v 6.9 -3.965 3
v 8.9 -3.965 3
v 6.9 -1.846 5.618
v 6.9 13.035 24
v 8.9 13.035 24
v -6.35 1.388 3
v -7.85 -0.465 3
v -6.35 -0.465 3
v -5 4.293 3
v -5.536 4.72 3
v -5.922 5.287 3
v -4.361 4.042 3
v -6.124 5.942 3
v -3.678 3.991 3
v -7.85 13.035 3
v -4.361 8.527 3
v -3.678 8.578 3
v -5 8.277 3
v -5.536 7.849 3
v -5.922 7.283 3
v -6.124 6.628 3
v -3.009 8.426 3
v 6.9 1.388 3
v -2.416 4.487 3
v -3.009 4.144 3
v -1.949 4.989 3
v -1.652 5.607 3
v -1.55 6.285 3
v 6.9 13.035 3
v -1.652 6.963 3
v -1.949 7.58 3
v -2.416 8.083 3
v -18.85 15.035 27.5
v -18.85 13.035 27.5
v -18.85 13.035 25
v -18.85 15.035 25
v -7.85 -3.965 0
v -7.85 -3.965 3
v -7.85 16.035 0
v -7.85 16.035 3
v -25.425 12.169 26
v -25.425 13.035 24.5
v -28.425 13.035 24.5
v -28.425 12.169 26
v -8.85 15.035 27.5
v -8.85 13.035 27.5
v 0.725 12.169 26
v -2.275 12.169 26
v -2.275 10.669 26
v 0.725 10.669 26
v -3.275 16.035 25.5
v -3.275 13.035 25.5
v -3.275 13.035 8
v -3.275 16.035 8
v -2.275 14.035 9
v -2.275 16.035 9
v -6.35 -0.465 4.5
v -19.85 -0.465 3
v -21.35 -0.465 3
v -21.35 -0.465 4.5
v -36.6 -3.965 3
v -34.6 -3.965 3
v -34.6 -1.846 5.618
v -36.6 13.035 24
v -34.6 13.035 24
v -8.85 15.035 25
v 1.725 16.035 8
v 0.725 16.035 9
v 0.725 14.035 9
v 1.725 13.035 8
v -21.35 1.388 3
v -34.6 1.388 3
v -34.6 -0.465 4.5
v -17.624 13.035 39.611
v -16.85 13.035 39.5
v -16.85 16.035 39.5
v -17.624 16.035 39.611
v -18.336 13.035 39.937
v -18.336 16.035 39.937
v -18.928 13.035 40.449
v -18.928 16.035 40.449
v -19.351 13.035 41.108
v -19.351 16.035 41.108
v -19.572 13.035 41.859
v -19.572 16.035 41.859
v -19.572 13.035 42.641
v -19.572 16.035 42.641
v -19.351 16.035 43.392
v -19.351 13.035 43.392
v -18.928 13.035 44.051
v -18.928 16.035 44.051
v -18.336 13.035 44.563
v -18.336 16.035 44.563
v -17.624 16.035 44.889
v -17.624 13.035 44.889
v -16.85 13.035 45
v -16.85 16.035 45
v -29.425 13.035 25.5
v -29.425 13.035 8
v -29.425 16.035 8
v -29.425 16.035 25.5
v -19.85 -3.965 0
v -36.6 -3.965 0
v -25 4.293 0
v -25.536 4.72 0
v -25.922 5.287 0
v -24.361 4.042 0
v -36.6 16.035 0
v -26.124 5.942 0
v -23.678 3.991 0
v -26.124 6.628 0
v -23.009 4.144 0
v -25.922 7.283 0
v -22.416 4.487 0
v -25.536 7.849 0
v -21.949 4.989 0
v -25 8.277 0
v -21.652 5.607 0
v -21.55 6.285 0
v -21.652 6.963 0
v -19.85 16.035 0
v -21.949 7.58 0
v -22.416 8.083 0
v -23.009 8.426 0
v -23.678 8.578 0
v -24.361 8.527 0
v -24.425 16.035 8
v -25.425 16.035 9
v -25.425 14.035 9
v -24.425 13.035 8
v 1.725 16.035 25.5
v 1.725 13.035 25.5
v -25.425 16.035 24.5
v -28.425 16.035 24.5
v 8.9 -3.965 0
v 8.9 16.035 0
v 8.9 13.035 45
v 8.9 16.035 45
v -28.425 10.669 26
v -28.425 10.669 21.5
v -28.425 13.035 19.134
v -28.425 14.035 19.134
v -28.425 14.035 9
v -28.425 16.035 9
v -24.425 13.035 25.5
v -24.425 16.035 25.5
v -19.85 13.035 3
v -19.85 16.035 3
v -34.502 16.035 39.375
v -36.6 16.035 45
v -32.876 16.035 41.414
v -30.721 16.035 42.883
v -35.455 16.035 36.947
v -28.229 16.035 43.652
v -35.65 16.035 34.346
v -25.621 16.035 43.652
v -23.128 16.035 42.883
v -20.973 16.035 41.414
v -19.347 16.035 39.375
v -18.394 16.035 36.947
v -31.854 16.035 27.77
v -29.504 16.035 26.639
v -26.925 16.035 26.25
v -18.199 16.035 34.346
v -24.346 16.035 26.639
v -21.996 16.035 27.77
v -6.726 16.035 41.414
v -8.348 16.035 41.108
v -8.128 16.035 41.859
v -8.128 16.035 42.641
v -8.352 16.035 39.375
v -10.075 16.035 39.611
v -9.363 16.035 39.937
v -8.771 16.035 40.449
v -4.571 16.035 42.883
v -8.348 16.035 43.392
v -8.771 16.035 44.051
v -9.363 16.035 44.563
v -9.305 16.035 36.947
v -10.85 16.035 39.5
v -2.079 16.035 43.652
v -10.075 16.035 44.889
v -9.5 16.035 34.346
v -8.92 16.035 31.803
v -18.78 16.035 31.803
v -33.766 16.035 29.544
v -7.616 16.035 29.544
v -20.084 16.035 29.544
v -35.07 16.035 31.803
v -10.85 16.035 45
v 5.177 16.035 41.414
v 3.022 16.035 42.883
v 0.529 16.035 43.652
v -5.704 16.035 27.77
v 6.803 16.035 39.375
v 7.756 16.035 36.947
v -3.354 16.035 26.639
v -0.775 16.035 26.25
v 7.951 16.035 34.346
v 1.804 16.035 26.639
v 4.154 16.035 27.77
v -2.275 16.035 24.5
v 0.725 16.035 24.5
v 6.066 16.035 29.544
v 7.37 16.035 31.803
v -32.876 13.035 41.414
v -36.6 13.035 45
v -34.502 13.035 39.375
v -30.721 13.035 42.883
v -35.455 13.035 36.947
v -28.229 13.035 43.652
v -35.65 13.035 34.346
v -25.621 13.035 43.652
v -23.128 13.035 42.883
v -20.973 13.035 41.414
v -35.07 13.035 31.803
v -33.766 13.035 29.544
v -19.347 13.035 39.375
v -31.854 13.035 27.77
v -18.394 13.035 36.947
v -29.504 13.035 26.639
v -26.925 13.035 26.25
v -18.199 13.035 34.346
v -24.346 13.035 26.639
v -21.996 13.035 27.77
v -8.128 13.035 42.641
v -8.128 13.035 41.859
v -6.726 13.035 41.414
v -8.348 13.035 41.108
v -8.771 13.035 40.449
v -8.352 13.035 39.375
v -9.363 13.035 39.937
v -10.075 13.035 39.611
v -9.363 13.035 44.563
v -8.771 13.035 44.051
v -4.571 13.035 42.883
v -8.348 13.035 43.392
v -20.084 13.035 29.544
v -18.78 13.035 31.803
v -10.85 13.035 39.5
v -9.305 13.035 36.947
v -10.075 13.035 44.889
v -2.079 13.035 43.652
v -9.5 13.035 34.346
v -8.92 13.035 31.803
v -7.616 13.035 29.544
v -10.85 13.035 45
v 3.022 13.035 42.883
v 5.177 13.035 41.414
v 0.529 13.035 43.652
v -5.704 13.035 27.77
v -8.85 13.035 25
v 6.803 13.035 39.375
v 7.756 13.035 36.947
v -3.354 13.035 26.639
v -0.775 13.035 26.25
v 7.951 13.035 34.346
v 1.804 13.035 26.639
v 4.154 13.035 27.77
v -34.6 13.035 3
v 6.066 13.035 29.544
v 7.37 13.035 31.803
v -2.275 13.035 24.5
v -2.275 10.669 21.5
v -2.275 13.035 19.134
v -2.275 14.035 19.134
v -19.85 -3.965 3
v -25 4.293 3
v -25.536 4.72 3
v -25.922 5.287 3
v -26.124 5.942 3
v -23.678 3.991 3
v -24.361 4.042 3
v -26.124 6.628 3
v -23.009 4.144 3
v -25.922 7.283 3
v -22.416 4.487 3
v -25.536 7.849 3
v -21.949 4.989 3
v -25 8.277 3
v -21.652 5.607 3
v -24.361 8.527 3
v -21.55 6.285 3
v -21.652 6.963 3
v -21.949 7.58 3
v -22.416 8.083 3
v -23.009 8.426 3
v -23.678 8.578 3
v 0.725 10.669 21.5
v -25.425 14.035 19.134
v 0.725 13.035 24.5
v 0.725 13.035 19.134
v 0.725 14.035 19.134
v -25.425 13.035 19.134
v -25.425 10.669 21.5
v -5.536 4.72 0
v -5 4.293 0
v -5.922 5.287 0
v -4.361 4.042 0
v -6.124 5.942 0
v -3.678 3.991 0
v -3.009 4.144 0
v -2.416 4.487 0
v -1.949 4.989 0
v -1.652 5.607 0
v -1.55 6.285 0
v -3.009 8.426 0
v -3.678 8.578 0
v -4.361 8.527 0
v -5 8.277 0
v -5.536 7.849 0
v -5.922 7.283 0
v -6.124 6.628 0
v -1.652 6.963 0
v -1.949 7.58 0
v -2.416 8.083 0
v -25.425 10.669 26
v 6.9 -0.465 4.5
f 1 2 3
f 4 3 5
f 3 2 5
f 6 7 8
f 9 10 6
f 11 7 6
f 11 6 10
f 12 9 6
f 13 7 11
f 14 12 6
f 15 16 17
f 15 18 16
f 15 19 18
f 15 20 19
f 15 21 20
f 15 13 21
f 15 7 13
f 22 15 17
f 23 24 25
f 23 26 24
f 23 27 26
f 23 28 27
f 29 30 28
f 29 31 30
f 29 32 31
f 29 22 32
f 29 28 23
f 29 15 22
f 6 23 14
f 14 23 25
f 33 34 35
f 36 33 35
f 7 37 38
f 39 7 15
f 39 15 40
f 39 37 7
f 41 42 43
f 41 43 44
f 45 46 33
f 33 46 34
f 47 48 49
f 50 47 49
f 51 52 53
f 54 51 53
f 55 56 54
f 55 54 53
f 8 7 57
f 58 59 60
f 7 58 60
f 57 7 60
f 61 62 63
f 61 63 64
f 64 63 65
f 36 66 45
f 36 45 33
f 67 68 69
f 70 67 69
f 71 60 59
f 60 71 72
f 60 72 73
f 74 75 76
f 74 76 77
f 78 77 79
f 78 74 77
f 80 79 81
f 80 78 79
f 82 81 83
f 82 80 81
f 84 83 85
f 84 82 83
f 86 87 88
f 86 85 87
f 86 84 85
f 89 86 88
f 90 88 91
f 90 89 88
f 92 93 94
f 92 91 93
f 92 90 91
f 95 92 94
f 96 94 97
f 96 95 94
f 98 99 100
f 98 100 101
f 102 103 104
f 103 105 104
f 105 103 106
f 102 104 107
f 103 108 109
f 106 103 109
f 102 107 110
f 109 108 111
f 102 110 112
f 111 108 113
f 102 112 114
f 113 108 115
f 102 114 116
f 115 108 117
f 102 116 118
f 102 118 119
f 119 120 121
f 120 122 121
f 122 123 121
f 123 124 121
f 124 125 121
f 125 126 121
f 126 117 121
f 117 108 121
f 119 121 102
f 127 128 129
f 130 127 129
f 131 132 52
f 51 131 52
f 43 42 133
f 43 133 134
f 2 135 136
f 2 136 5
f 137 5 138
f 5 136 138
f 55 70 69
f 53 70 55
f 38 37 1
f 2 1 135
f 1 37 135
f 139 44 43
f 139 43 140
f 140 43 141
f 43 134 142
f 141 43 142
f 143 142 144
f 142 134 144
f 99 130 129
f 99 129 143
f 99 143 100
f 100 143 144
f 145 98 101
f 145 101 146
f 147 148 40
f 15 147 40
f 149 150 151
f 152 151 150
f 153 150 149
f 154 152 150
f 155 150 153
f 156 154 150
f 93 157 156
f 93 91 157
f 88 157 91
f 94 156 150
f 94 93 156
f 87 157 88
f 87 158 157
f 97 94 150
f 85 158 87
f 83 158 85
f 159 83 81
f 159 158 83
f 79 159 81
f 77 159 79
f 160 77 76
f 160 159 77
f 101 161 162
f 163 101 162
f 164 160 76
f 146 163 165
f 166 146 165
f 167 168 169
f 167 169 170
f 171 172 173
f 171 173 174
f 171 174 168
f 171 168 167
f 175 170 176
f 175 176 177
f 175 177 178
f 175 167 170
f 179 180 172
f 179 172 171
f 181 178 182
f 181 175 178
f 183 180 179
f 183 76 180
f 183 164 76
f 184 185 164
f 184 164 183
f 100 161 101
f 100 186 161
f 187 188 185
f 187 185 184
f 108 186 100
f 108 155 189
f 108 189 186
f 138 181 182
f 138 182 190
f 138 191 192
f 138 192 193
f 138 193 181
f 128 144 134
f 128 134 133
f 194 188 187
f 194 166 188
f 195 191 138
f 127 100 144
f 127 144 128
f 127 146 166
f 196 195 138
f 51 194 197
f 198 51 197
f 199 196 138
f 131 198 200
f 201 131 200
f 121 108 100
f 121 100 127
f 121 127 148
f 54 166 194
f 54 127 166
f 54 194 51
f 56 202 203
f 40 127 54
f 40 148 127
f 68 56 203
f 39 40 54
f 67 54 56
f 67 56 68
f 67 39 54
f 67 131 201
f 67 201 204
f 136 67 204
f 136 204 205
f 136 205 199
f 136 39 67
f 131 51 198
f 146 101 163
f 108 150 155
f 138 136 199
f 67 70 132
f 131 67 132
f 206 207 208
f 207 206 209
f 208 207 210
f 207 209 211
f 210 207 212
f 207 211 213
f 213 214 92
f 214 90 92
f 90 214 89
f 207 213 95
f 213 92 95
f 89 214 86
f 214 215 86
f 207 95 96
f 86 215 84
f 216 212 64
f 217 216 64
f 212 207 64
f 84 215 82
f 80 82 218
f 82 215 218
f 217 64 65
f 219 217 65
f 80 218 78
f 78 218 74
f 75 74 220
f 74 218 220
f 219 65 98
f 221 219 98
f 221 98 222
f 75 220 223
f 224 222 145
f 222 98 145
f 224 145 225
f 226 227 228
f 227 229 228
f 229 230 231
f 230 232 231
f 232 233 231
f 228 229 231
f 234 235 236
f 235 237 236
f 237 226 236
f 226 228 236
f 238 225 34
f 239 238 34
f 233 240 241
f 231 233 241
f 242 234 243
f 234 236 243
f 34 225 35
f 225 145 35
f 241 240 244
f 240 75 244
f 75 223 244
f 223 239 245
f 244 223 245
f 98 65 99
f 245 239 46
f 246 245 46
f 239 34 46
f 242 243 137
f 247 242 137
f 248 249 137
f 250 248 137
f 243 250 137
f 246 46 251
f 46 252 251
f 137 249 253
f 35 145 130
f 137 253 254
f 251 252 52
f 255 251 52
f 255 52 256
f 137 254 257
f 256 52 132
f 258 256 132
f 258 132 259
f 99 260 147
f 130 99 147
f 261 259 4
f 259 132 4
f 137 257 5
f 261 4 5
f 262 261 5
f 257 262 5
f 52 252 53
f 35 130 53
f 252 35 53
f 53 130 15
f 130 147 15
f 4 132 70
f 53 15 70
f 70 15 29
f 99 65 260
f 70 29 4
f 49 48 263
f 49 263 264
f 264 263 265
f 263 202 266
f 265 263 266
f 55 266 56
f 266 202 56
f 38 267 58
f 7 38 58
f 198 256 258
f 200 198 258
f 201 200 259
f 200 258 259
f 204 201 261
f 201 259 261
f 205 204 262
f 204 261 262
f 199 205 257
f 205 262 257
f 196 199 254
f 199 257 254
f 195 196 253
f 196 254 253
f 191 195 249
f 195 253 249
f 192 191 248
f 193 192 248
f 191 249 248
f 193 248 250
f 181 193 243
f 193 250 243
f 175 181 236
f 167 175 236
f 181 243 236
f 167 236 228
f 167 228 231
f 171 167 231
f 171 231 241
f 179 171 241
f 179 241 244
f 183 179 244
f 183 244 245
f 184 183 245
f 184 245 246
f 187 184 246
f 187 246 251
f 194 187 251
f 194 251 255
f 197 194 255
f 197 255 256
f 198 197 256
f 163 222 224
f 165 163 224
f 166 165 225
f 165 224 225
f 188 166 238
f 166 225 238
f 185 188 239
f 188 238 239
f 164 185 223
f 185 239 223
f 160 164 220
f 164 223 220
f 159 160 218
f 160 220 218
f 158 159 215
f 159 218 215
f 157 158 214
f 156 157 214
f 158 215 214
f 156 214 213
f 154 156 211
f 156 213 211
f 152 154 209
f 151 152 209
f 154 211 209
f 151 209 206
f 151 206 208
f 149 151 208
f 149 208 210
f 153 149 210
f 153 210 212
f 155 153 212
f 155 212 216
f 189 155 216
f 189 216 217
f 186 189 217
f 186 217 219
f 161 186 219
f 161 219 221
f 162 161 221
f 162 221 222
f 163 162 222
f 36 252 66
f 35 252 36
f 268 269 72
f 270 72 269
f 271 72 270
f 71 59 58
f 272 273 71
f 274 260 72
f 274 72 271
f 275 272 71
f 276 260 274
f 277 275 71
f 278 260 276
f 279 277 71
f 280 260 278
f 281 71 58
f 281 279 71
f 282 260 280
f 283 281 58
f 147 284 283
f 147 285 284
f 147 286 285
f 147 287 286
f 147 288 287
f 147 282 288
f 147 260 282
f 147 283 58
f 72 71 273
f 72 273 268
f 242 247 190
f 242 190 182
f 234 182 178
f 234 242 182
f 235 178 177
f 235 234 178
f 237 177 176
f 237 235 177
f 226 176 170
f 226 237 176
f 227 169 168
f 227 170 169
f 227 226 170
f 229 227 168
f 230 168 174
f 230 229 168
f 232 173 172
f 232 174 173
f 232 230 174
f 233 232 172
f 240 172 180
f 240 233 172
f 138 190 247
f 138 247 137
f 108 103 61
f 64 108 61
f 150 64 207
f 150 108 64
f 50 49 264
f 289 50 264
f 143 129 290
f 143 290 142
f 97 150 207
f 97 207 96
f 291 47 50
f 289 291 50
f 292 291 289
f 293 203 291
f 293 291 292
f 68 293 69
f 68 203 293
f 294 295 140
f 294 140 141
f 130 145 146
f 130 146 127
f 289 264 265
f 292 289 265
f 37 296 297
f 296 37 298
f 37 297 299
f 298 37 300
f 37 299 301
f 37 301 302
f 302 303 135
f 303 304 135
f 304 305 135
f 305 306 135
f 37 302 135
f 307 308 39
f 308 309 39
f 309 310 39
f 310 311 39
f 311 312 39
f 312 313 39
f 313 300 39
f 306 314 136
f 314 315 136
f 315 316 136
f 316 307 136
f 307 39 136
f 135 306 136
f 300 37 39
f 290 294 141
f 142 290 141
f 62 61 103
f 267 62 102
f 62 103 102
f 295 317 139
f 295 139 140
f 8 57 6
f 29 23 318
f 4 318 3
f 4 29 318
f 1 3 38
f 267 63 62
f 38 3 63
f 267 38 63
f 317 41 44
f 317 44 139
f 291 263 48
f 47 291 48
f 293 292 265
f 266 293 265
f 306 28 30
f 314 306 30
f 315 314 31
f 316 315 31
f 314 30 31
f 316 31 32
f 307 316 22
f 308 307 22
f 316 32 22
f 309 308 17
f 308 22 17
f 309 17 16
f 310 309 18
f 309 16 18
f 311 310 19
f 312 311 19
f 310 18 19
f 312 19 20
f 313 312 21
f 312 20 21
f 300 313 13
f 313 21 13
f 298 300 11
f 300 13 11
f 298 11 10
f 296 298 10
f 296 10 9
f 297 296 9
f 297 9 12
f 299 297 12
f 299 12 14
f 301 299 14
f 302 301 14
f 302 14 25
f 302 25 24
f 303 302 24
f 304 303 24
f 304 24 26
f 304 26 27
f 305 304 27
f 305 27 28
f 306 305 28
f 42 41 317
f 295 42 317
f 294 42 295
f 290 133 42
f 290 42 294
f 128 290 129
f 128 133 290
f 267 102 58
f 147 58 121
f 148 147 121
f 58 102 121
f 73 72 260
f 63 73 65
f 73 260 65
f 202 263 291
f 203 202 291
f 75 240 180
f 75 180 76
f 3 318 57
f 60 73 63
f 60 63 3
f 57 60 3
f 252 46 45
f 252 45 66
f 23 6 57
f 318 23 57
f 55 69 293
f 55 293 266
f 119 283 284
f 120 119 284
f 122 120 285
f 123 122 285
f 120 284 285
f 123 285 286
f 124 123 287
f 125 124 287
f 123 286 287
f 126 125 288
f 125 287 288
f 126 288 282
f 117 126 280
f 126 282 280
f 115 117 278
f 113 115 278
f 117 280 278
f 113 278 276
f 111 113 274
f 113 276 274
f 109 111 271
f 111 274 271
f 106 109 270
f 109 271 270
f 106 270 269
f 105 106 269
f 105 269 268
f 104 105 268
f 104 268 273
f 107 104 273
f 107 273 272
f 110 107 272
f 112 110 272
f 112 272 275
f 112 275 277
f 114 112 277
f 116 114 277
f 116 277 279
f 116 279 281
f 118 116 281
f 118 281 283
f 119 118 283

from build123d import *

# Parameters (mm, degrees)
SKETCH1_W               = 16.75
SKETCH1_H               = 20
BOSS_EXTRUDE1_DEPTH     = 3
BOSS_EXTRUDE1_2_DEPTH   = 3
SKETCH2_W               = 45.5
SKETCH2_H               = 3
BOSS_EXTRUDE2_DEPTH     = 42
SKETCH3_R               = 8.75
CUT_EXTRUDE1_DEPTH      = 61.44447165
BOSS_EXTRUDE3_DEPTH     = 2
LPATTERN1_COUNT         = 2
LPATTERN1_PITCH         = 43.5
CUT_EXTRUDE2_DEPTH      = 61.44447165
BOSS_EXTRUDE4_DEPTH     = 3
CUT_EXTRUDE3_DEPTH      = 61.44447165
SKETCH10_W              = 10
SKETCH10_H              = 2.5
CUT_EXTRUDE4_DEPTH      = 2
BOSS_EXTRUDE5_REACH     = 66.609
SKETCH13_W              = 3
SKETCH13_H              = 11.133974596
CUT_EXTRUDE6_DEPTH      = 1
CHAMFER1_SIZE           = 1
BOSS_EXTRUDE6_DEPTH     = 13.25
CHAMFER2_SIZE           = 1
ENL_V_MAT_EXTRU_1_REACH = 59.971
ESQUISSE1_R             = 2.3


with BuildPart() as part:
    # Sketch1 → Boss-Extrude1 (new body)
    with BuildSketch(Plane.XY):
        with Locations((-28.224646897, 6.034741944)):
            Rectangle(SKETCH1_W, SKETCH1_H)
    extrude(amount=BOSS_EXTRUDE1_DEPTH)


with BuildPart() as body_2:
    # Sketch1 → Boss-Extrude1 2 (new body)
    with BuildSketch(Plane.XY):
        with Locations((0.525353103, 6.034741944)):
            Rectangle(SKETCH1_W, SKETCH1_H)
    extrude(amount=BOSS_EXTRUDE1_2_DEPTH)



with BuildPart() as body_3:
    # Sketch2 → Boss-Extrude2 (new body)
    with BuildSketch(Plane.XY.offset(3)):
        with Locations((-13.849646897, 14.534741944)):
            Rectangle(SKETCH2_W, SKETCH2_H)
    extrude(amount=BOSS_EXTRUDE2_DEPTH)

    # Sketch3 → Cut-Extrude1 (cut, through all)
    with BuildSketch(Plane(origin=(0, 13.034741944, 0), x_dir=(-1, 0, 0), z_dir=(0, -1, 0))):
        with Locations(Location((26.924646897, -35, 0), (0, 0, 90))):
            Circle(SKETCH3_R)
        with Locations(Location((0.774646897, -35, 0), (0, 0, 90))):
            Circle(SKETCH3_R)
    extrude(amount=-CUT_EXTRUDE1_DEPTH, mode=Mode.SUBTRACT)


with BuildPart() as body_2_1:
    add(body_2.part)

    add(body_3.part)  # Boss-Extrude3 merges body 3
    # Sketch4 → Boss-Extrude3 (add)
    with BuildSketch(Plane(origin=(8.900353103, 0, 0), x_dir=(0, 0, -1), z_dir=(1, 0, 0))):
        Polygon((-3, -3.965258056), (-24, 13.034741944), (-3, 13.034741944), align=None)
    boss_extrude3 = extrude(amount=-BOSS_EXTRUDE3_DEPTH)


with BuildPart() as part_1:
    add(part.part)

    add(body_2_1.part)  # LPattern1 merges body 2
    # LPattern1: Boss-Extrude3 ×2
    with Locations(*[(-i * LPATTERN1_PITCH, 0, 0) for i in range(1, LPATTERN1_COUNT)]):
        add(boss_extrude3)

    # Sketch5 → Cut-Extrude2 (cut, through all)
    with BuildSketch(Plane(origin=(0, 13.034741944, 0), x_dir=(-1, 0, 0), z_dir=(0, -1, 0))):
        Polygon((29.424646897, -8), (29.424646897, -25.5), (24.424646897, -25.5), (24.424646897, -8), (25.424646897, -8), (25.424646897, -24.5), (28.424646897, -24.5), (28.424646897, -8), align=None)
        Polygon((-0.725353103, -8), (-1.725353103, -8), (-1.725353103, -25.5), (3.274646897, -25.5), (3.274646897, -8), (2.274646897, -8), (2.274646897, -24.5), (-0.725353103, -24.5), align=None)
    extrude(amount=-CUT_EXTRUDE2_DEPTH, mode=Mode.SUBTRACT)

    # Sketch6 → Boss-Extrude4 (add)
    with BuildSketch(Plane(origin=(-25.424646897, 0, 0), x_dir=(0, 0, -1), z_dir=(1, 0, 0))):
        Polygon((-24.5, 13.034741944), (-26, 12.16871654), (-26, 10.66871654), (-21.5, 10.66871654), (-19.133974596, 13.034741944), align=None)
    boss_extrude4 = extrude(amount=-BOSS_EXTRUDE4_DEPTH)

    # Mirror7: Boss-Extrude4 across plane
    add(boss_extrude4.mirror(Plane(origin=(-13.849646897, 13.034741944, 8), x_dir=(0, 0, 1), z_dir=(1, 0, 0))))

    # Sketch9 → Cut-Extrude3 (cut, through all)
    with BuildSketch(Plane(origin=(0, 13.034741944, 0), x_dir=(-1, 0, 0), z_dir=(0, -1, 0))):
        with BuildLine():
            Line((16.849646897, -45), (10.849646897, -45))
            ThreePointArc((10.849646897, -45), (8.099646897, -42.25), (10.849646897, -39.5))
            Line((10.849646897, -39.5), (16.849646897, -39.5))
            ThreePointArc((16.849646897, -39.5), (19.599646897, -42.25), (16.849646897, -45))
        make_face()
    extrude(amount=-CUT_EXTRUDE3_DEPTH, mode=Mode.SUBTRACT)

    # Sketch10 → Cut-Extrude4 (cut)
    with BuildSketch(Plane(origin=(0, 13.034741944, 0), x_dir=(-1, 0, 0), z_dir=(0, -1, 0))):
        with Locations((13.849646897, -26.25)):
            Rectangle(SKETCH10_W, SKETCH10_H)
    extrude(amount=-CUT_EXTRUDE4_DEPTH, mode=Mode.SUBTRACT)

    # Boss-Extrude5: up to this face of the body (flat: up to its plane)
    boss_extrude5_end = Plane(part_1.part.faces().sort_by_distance((6.900353103, 7.368075277, 10))[0])
    # Sketch11 → Boss-Extrude5 (add, up to the picked face)
    with BuildSketch(Plane(origin=(-34.599646897, 0, 0), x_dir=(0, 0, -1), z_dir=(1, 0, 0)), mode=Mode.PRIVATE) as boss_extrude5_sk1:
        Polygon((-5.617808219, -1.846079974), (-3, -3.965258056), (-3, -0.465258056), (-4.5, -0.465258056), align=None)
    boss_extrude5_tool1 = split(extrude(boss_extrude5_sk1.sketch, amount=BOSS_EXTRUDE5_REACH, mode=Mode.PRIVATE), bisect_by=boss_extrude5_end, keep=Keep.BOTH, mode=Mode.PRIVATE)
    add(boss_extrude5_tool1.solids().sort_by(Axis((-34.599647, -1.87709, 3.964792), (1, 0, 0)))[0])

    # Sketch13 → Cut-Extrude6 (cut)
    with BuildSketch(Plane(origin=(0, 13.034741944, 0), x_dir=(-1, 0, 0), z_dir=(0, -1, 0))):
        with Locations((26.924646897, -13.566987298)):
            Rectangle(SKETCH13_W, SKETCH13_H)
        with Locations((0.774646897, -13.566987298)):
            Rectangle(SKETCH13_W, SKETCH13_H)
    extrude(amount=-CUT_EXTRUDE6_DEPTH, mode=Mode.SUBTRACT)

    # Chamfer1
    chamfer1_edges = [part_1.edges().sort_by_distance(p)[0] for p in [
        (-26.924646897, 14.034741944, 8),
        (-0.774646897, 14.034741944, 8),
    ]]
    chamfer(chamfer1_edges, length=CHAMFER1_SIZE - 0.0001)  # a hair under: the kernel refuses the full size

    # Sketch11<3> → Boss-Extrude6 (add)
    with BuildSketch(Plane(origin=(-34.599646897, 0, 0), x_dir=(0, 0, -1), z_dir=(1, 0, 0))):
        Polygon((-4.5, -0.465258056), (-3, -0.465258056), (-3, 1.38768312), align=None)
    boss_extrude6 = extrude(amount=BOSS_EXTRUDE6_DEPTH)

    # Mirror8: Boss-Extrude6 across plane
    add(boss_extrude6.mirror(Plane(origin=(-13.849646897, 13.034741944, 8), x_dir=(0, 0, 1), z_dir=(1, 0, 0))))

    # Chamfer2
    chamfer2_edges = [part_1.edges().sort_by_distance(p)[0] for p in [
        (-28.424646897, 14.534791944, 8),
        (-2.274646897, 14.534791944, 8),
        (-25.424646897, 14.534791944, 8),
        (0.725353103, 14.534791944, 8),
    ]]
    chamfer(chamfer2_edges, length=CHAMFER2_SIZE - 0.0001)  # a hair under: the kernel refuses the full size

    # Esquisse1 → Enlèv. mat.-Extru.1 (cut, up to next)
    with BuildSketch(Plane.XY.offset(3), mode=Mode.PRIVATE) as enl_v_mat_extru_1_sk1:
        with Locations((-3.849646897, 6.284741944)):
            Circle(ESQUISSE1_R)
    enl_v_mat_extru_1_tool1 = extrude(enl_v_mat_extru_1_sk1.sketch, amount=-ENL_V_MAT_EXTRU_1_REACH, mode=Mode.PRIVATE) & part_1.part
    # Esquisse1 → Enlèv. mat.-Extru.1 (cut, up to next)
    with BuildSketch(Plane.XY.offset(3), mode=Mode.PRIVATE) as enl_v_mat_extru_1_sk2:
        with Locations((-23.849646897, 6.284741944)):
            Circle(ESQUISSE1_R)
    enl_v_mat_extru_1_tool2 = extrude(enl_v_mat_extru_1_sk2.sketch, amount=-ENL_V_MAT_EXTRU_1_REACH, mode=Mode.PRIVATE) & part_1.part
    add(enl_v_mat_extru_1_tool1.solids().sort_by_distance((-3.849647, 6.284742, 3))[0], mode=Mode.SUBTRACT)
    add(enl_v_mat_extru_1_tool2.solids().sort_by_distance((-23.849647, 6.284742, 3))[0], mode=Mode.SUBTRACT)


solid = part_1.part
